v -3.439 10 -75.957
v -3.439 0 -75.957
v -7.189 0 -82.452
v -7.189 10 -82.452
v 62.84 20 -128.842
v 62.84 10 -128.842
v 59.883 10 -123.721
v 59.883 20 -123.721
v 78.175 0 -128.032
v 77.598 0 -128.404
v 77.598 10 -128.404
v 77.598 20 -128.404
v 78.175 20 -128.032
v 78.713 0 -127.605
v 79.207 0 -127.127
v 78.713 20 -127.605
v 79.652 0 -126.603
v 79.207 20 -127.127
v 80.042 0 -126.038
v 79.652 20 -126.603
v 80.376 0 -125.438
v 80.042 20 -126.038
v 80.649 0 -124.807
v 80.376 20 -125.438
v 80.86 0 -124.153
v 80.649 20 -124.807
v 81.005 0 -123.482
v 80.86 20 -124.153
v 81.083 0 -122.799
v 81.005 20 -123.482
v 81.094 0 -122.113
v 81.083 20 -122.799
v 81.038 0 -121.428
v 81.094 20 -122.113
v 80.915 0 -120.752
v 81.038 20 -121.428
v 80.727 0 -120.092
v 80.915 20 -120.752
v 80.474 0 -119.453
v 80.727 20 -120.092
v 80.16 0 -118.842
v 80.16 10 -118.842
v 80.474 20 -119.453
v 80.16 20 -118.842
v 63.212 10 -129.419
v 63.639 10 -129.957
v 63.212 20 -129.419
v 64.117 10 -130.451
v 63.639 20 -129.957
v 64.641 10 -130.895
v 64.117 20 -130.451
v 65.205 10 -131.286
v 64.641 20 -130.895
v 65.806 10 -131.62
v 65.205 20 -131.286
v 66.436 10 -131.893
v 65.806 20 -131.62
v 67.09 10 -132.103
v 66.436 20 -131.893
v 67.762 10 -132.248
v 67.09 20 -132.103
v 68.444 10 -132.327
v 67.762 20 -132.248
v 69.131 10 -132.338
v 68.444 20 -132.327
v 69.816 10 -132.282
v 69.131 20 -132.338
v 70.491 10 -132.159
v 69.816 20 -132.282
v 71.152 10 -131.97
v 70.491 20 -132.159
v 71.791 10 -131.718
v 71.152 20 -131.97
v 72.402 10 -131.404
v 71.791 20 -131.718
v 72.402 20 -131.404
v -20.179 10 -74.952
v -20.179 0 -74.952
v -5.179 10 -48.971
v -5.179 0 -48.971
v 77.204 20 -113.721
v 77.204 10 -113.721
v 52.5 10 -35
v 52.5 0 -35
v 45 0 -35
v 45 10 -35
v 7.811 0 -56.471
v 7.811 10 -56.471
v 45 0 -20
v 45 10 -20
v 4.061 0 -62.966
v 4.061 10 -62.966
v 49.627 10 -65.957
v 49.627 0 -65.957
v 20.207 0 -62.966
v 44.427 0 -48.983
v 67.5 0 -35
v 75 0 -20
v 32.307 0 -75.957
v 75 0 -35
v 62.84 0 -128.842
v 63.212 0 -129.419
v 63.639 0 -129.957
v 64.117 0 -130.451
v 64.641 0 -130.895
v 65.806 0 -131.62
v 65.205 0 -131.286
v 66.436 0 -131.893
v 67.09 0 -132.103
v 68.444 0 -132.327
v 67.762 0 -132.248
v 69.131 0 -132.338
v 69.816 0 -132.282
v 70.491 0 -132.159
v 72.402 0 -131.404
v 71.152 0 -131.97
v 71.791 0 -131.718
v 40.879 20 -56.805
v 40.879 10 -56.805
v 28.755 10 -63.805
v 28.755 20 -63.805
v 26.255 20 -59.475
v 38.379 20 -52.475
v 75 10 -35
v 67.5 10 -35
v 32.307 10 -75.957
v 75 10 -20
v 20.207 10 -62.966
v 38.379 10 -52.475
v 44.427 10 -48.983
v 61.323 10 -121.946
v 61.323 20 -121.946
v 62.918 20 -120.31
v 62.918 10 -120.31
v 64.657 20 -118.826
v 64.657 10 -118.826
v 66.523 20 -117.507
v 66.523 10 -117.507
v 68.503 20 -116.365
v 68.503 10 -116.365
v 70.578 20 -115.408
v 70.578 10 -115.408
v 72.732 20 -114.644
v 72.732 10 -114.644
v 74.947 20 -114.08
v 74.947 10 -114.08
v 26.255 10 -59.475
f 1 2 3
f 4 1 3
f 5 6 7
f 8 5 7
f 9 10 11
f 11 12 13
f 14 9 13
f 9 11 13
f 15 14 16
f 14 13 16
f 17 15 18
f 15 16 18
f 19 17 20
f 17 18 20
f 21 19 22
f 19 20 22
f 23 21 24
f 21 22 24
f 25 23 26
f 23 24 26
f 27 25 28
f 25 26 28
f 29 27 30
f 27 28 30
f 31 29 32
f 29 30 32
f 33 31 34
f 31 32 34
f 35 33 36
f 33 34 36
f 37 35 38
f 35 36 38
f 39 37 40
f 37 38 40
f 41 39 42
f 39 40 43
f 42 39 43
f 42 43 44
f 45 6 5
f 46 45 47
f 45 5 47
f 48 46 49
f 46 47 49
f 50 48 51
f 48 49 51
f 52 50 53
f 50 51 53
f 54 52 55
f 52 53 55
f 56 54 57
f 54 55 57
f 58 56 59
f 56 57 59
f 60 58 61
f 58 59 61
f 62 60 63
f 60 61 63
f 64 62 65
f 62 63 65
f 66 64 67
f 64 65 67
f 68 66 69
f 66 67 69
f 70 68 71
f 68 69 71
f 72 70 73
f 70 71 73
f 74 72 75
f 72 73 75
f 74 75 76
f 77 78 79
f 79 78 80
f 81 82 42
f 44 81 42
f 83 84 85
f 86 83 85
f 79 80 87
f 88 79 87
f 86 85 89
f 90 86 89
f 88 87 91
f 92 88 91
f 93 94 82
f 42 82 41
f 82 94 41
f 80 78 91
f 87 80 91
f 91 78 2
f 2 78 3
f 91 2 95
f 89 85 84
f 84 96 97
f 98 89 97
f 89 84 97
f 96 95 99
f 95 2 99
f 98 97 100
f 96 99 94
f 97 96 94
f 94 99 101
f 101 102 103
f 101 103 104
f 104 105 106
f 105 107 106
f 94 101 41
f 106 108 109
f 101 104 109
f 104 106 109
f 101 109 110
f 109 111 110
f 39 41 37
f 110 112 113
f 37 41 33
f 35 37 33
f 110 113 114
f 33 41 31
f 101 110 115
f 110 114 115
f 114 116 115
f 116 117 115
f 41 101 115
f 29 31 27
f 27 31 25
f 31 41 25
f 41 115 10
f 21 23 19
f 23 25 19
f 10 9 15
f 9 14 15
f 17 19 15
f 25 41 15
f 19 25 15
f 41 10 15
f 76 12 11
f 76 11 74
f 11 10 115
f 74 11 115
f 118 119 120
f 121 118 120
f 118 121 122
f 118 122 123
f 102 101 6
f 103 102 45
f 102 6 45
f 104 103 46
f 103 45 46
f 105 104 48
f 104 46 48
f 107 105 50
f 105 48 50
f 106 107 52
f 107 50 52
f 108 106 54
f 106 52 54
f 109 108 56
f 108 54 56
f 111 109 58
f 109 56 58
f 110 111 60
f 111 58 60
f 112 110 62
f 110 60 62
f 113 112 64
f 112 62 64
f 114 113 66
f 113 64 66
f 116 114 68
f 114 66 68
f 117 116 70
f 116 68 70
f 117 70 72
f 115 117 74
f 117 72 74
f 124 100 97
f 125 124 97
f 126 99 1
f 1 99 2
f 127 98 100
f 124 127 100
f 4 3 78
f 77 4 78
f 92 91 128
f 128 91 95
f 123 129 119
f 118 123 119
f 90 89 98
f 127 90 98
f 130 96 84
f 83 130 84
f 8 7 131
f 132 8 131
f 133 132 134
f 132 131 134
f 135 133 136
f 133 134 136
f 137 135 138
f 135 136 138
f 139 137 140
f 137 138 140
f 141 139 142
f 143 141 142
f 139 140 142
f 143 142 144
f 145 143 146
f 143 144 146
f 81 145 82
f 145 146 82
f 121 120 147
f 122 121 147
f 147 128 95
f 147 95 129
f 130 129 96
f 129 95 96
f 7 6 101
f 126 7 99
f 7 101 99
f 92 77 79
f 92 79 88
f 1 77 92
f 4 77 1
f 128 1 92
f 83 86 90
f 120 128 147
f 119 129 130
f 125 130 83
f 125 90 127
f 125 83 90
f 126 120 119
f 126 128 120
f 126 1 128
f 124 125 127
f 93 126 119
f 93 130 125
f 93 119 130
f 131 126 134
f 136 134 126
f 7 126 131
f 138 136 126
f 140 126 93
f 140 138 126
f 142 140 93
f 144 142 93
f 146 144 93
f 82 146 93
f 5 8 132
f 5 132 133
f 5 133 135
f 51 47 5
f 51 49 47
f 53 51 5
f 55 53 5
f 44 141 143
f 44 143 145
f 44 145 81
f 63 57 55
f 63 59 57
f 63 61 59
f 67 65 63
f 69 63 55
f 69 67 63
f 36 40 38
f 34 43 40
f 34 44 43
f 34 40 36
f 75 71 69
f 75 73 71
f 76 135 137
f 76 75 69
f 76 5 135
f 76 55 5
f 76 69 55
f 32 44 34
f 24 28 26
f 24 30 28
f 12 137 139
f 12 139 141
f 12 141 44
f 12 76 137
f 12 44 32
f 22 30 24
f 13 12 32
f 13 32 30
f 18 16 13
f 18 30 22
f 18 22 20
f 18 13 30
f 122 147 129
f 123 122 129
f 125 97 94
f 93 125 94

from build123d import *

# Parameters (mm, degrees)
EXTRUDE_1_DEPTH = 10
EXTRUDE_2_DEPTH = 10
EXTRUDE_4_DEPTH = 10
FILLET_1_R      = 7


with BuildPart() as part:
    # 草图2 → 凸台-拉伸1 (new body)
    with BuildSketch(Plane(origin=(0, 0, 0), x_dir=(1, 0, 0), z_dir=(0, 1, 0))):
        Polygon((-20.179491924, 74.951905284), (-5.179491924, 48.97114317), (7.810889132, 56.47114317), (4.060889132, 62.966333699), (20.207259422, 62.966333699), (44.426814855, 48.983166849), (52.5, 35), (45, 35), (45, 20), (75, 20), (75, 35), (67.5, 35), (49.627132403, 65.956714755), (83.660254038, 124.903810568), (66.339745962, 134.903810568), (32.306624327, 75.956714755), (-3.439110868, 75.956714755), (-7.189110868, 82.451905284), align=None)
    extrude(amount=EXTRUDE_1_DEPTH)

    # 草图3 → 凸台-拉伸2 (add)
    with BuildSketch(Plane(origin=(0, 10, 0), x_dir=(1, 0, 0), z_dir=(0, 1, 0))):
        with BuildLine():
            Line((66.339745962, 134.903810568), (59.883306725, 123.720929773))
            ThreePointArc((59.883306725, 123.720929773), (67.5, 116.913429511), (77.2038148, 113.720929773))
            Line((77.2038148, 113.720929773), (83.660254038, 124.903810568))
            Line((83.660254038, 124.903810568), (66.339745962, 134.903810568))
        make_face()
    extrude(amount=EXTRUDE_2_DEPTH)

    # 草图5 → 凸台-拉伸4 (add)
    with BuildSketch(Plane(origin=(0, 10, 0), x_dir=(1, 0, 0), z_dir=(0, 1, 0))):
        Polygon((38.379214965, 52.474750274), (40.879214965, 56.804877293), (28.754859312, 63.804877293), (26.254859312, 59.474750274), align=None)
    extrude(amount=EXTRUDE_4_DEPTH)

    # 圆角1
    fillet_1_edges = [part.edges().sort_by_distance(p)[0] for p in [
        (66.339745962, 10, -134.903810568),
        (83.660254038, 10, -124.903810568),
    ]]
    fillet(fillet_1_edges, radius=FILLET_1_R)


solid = part.part
